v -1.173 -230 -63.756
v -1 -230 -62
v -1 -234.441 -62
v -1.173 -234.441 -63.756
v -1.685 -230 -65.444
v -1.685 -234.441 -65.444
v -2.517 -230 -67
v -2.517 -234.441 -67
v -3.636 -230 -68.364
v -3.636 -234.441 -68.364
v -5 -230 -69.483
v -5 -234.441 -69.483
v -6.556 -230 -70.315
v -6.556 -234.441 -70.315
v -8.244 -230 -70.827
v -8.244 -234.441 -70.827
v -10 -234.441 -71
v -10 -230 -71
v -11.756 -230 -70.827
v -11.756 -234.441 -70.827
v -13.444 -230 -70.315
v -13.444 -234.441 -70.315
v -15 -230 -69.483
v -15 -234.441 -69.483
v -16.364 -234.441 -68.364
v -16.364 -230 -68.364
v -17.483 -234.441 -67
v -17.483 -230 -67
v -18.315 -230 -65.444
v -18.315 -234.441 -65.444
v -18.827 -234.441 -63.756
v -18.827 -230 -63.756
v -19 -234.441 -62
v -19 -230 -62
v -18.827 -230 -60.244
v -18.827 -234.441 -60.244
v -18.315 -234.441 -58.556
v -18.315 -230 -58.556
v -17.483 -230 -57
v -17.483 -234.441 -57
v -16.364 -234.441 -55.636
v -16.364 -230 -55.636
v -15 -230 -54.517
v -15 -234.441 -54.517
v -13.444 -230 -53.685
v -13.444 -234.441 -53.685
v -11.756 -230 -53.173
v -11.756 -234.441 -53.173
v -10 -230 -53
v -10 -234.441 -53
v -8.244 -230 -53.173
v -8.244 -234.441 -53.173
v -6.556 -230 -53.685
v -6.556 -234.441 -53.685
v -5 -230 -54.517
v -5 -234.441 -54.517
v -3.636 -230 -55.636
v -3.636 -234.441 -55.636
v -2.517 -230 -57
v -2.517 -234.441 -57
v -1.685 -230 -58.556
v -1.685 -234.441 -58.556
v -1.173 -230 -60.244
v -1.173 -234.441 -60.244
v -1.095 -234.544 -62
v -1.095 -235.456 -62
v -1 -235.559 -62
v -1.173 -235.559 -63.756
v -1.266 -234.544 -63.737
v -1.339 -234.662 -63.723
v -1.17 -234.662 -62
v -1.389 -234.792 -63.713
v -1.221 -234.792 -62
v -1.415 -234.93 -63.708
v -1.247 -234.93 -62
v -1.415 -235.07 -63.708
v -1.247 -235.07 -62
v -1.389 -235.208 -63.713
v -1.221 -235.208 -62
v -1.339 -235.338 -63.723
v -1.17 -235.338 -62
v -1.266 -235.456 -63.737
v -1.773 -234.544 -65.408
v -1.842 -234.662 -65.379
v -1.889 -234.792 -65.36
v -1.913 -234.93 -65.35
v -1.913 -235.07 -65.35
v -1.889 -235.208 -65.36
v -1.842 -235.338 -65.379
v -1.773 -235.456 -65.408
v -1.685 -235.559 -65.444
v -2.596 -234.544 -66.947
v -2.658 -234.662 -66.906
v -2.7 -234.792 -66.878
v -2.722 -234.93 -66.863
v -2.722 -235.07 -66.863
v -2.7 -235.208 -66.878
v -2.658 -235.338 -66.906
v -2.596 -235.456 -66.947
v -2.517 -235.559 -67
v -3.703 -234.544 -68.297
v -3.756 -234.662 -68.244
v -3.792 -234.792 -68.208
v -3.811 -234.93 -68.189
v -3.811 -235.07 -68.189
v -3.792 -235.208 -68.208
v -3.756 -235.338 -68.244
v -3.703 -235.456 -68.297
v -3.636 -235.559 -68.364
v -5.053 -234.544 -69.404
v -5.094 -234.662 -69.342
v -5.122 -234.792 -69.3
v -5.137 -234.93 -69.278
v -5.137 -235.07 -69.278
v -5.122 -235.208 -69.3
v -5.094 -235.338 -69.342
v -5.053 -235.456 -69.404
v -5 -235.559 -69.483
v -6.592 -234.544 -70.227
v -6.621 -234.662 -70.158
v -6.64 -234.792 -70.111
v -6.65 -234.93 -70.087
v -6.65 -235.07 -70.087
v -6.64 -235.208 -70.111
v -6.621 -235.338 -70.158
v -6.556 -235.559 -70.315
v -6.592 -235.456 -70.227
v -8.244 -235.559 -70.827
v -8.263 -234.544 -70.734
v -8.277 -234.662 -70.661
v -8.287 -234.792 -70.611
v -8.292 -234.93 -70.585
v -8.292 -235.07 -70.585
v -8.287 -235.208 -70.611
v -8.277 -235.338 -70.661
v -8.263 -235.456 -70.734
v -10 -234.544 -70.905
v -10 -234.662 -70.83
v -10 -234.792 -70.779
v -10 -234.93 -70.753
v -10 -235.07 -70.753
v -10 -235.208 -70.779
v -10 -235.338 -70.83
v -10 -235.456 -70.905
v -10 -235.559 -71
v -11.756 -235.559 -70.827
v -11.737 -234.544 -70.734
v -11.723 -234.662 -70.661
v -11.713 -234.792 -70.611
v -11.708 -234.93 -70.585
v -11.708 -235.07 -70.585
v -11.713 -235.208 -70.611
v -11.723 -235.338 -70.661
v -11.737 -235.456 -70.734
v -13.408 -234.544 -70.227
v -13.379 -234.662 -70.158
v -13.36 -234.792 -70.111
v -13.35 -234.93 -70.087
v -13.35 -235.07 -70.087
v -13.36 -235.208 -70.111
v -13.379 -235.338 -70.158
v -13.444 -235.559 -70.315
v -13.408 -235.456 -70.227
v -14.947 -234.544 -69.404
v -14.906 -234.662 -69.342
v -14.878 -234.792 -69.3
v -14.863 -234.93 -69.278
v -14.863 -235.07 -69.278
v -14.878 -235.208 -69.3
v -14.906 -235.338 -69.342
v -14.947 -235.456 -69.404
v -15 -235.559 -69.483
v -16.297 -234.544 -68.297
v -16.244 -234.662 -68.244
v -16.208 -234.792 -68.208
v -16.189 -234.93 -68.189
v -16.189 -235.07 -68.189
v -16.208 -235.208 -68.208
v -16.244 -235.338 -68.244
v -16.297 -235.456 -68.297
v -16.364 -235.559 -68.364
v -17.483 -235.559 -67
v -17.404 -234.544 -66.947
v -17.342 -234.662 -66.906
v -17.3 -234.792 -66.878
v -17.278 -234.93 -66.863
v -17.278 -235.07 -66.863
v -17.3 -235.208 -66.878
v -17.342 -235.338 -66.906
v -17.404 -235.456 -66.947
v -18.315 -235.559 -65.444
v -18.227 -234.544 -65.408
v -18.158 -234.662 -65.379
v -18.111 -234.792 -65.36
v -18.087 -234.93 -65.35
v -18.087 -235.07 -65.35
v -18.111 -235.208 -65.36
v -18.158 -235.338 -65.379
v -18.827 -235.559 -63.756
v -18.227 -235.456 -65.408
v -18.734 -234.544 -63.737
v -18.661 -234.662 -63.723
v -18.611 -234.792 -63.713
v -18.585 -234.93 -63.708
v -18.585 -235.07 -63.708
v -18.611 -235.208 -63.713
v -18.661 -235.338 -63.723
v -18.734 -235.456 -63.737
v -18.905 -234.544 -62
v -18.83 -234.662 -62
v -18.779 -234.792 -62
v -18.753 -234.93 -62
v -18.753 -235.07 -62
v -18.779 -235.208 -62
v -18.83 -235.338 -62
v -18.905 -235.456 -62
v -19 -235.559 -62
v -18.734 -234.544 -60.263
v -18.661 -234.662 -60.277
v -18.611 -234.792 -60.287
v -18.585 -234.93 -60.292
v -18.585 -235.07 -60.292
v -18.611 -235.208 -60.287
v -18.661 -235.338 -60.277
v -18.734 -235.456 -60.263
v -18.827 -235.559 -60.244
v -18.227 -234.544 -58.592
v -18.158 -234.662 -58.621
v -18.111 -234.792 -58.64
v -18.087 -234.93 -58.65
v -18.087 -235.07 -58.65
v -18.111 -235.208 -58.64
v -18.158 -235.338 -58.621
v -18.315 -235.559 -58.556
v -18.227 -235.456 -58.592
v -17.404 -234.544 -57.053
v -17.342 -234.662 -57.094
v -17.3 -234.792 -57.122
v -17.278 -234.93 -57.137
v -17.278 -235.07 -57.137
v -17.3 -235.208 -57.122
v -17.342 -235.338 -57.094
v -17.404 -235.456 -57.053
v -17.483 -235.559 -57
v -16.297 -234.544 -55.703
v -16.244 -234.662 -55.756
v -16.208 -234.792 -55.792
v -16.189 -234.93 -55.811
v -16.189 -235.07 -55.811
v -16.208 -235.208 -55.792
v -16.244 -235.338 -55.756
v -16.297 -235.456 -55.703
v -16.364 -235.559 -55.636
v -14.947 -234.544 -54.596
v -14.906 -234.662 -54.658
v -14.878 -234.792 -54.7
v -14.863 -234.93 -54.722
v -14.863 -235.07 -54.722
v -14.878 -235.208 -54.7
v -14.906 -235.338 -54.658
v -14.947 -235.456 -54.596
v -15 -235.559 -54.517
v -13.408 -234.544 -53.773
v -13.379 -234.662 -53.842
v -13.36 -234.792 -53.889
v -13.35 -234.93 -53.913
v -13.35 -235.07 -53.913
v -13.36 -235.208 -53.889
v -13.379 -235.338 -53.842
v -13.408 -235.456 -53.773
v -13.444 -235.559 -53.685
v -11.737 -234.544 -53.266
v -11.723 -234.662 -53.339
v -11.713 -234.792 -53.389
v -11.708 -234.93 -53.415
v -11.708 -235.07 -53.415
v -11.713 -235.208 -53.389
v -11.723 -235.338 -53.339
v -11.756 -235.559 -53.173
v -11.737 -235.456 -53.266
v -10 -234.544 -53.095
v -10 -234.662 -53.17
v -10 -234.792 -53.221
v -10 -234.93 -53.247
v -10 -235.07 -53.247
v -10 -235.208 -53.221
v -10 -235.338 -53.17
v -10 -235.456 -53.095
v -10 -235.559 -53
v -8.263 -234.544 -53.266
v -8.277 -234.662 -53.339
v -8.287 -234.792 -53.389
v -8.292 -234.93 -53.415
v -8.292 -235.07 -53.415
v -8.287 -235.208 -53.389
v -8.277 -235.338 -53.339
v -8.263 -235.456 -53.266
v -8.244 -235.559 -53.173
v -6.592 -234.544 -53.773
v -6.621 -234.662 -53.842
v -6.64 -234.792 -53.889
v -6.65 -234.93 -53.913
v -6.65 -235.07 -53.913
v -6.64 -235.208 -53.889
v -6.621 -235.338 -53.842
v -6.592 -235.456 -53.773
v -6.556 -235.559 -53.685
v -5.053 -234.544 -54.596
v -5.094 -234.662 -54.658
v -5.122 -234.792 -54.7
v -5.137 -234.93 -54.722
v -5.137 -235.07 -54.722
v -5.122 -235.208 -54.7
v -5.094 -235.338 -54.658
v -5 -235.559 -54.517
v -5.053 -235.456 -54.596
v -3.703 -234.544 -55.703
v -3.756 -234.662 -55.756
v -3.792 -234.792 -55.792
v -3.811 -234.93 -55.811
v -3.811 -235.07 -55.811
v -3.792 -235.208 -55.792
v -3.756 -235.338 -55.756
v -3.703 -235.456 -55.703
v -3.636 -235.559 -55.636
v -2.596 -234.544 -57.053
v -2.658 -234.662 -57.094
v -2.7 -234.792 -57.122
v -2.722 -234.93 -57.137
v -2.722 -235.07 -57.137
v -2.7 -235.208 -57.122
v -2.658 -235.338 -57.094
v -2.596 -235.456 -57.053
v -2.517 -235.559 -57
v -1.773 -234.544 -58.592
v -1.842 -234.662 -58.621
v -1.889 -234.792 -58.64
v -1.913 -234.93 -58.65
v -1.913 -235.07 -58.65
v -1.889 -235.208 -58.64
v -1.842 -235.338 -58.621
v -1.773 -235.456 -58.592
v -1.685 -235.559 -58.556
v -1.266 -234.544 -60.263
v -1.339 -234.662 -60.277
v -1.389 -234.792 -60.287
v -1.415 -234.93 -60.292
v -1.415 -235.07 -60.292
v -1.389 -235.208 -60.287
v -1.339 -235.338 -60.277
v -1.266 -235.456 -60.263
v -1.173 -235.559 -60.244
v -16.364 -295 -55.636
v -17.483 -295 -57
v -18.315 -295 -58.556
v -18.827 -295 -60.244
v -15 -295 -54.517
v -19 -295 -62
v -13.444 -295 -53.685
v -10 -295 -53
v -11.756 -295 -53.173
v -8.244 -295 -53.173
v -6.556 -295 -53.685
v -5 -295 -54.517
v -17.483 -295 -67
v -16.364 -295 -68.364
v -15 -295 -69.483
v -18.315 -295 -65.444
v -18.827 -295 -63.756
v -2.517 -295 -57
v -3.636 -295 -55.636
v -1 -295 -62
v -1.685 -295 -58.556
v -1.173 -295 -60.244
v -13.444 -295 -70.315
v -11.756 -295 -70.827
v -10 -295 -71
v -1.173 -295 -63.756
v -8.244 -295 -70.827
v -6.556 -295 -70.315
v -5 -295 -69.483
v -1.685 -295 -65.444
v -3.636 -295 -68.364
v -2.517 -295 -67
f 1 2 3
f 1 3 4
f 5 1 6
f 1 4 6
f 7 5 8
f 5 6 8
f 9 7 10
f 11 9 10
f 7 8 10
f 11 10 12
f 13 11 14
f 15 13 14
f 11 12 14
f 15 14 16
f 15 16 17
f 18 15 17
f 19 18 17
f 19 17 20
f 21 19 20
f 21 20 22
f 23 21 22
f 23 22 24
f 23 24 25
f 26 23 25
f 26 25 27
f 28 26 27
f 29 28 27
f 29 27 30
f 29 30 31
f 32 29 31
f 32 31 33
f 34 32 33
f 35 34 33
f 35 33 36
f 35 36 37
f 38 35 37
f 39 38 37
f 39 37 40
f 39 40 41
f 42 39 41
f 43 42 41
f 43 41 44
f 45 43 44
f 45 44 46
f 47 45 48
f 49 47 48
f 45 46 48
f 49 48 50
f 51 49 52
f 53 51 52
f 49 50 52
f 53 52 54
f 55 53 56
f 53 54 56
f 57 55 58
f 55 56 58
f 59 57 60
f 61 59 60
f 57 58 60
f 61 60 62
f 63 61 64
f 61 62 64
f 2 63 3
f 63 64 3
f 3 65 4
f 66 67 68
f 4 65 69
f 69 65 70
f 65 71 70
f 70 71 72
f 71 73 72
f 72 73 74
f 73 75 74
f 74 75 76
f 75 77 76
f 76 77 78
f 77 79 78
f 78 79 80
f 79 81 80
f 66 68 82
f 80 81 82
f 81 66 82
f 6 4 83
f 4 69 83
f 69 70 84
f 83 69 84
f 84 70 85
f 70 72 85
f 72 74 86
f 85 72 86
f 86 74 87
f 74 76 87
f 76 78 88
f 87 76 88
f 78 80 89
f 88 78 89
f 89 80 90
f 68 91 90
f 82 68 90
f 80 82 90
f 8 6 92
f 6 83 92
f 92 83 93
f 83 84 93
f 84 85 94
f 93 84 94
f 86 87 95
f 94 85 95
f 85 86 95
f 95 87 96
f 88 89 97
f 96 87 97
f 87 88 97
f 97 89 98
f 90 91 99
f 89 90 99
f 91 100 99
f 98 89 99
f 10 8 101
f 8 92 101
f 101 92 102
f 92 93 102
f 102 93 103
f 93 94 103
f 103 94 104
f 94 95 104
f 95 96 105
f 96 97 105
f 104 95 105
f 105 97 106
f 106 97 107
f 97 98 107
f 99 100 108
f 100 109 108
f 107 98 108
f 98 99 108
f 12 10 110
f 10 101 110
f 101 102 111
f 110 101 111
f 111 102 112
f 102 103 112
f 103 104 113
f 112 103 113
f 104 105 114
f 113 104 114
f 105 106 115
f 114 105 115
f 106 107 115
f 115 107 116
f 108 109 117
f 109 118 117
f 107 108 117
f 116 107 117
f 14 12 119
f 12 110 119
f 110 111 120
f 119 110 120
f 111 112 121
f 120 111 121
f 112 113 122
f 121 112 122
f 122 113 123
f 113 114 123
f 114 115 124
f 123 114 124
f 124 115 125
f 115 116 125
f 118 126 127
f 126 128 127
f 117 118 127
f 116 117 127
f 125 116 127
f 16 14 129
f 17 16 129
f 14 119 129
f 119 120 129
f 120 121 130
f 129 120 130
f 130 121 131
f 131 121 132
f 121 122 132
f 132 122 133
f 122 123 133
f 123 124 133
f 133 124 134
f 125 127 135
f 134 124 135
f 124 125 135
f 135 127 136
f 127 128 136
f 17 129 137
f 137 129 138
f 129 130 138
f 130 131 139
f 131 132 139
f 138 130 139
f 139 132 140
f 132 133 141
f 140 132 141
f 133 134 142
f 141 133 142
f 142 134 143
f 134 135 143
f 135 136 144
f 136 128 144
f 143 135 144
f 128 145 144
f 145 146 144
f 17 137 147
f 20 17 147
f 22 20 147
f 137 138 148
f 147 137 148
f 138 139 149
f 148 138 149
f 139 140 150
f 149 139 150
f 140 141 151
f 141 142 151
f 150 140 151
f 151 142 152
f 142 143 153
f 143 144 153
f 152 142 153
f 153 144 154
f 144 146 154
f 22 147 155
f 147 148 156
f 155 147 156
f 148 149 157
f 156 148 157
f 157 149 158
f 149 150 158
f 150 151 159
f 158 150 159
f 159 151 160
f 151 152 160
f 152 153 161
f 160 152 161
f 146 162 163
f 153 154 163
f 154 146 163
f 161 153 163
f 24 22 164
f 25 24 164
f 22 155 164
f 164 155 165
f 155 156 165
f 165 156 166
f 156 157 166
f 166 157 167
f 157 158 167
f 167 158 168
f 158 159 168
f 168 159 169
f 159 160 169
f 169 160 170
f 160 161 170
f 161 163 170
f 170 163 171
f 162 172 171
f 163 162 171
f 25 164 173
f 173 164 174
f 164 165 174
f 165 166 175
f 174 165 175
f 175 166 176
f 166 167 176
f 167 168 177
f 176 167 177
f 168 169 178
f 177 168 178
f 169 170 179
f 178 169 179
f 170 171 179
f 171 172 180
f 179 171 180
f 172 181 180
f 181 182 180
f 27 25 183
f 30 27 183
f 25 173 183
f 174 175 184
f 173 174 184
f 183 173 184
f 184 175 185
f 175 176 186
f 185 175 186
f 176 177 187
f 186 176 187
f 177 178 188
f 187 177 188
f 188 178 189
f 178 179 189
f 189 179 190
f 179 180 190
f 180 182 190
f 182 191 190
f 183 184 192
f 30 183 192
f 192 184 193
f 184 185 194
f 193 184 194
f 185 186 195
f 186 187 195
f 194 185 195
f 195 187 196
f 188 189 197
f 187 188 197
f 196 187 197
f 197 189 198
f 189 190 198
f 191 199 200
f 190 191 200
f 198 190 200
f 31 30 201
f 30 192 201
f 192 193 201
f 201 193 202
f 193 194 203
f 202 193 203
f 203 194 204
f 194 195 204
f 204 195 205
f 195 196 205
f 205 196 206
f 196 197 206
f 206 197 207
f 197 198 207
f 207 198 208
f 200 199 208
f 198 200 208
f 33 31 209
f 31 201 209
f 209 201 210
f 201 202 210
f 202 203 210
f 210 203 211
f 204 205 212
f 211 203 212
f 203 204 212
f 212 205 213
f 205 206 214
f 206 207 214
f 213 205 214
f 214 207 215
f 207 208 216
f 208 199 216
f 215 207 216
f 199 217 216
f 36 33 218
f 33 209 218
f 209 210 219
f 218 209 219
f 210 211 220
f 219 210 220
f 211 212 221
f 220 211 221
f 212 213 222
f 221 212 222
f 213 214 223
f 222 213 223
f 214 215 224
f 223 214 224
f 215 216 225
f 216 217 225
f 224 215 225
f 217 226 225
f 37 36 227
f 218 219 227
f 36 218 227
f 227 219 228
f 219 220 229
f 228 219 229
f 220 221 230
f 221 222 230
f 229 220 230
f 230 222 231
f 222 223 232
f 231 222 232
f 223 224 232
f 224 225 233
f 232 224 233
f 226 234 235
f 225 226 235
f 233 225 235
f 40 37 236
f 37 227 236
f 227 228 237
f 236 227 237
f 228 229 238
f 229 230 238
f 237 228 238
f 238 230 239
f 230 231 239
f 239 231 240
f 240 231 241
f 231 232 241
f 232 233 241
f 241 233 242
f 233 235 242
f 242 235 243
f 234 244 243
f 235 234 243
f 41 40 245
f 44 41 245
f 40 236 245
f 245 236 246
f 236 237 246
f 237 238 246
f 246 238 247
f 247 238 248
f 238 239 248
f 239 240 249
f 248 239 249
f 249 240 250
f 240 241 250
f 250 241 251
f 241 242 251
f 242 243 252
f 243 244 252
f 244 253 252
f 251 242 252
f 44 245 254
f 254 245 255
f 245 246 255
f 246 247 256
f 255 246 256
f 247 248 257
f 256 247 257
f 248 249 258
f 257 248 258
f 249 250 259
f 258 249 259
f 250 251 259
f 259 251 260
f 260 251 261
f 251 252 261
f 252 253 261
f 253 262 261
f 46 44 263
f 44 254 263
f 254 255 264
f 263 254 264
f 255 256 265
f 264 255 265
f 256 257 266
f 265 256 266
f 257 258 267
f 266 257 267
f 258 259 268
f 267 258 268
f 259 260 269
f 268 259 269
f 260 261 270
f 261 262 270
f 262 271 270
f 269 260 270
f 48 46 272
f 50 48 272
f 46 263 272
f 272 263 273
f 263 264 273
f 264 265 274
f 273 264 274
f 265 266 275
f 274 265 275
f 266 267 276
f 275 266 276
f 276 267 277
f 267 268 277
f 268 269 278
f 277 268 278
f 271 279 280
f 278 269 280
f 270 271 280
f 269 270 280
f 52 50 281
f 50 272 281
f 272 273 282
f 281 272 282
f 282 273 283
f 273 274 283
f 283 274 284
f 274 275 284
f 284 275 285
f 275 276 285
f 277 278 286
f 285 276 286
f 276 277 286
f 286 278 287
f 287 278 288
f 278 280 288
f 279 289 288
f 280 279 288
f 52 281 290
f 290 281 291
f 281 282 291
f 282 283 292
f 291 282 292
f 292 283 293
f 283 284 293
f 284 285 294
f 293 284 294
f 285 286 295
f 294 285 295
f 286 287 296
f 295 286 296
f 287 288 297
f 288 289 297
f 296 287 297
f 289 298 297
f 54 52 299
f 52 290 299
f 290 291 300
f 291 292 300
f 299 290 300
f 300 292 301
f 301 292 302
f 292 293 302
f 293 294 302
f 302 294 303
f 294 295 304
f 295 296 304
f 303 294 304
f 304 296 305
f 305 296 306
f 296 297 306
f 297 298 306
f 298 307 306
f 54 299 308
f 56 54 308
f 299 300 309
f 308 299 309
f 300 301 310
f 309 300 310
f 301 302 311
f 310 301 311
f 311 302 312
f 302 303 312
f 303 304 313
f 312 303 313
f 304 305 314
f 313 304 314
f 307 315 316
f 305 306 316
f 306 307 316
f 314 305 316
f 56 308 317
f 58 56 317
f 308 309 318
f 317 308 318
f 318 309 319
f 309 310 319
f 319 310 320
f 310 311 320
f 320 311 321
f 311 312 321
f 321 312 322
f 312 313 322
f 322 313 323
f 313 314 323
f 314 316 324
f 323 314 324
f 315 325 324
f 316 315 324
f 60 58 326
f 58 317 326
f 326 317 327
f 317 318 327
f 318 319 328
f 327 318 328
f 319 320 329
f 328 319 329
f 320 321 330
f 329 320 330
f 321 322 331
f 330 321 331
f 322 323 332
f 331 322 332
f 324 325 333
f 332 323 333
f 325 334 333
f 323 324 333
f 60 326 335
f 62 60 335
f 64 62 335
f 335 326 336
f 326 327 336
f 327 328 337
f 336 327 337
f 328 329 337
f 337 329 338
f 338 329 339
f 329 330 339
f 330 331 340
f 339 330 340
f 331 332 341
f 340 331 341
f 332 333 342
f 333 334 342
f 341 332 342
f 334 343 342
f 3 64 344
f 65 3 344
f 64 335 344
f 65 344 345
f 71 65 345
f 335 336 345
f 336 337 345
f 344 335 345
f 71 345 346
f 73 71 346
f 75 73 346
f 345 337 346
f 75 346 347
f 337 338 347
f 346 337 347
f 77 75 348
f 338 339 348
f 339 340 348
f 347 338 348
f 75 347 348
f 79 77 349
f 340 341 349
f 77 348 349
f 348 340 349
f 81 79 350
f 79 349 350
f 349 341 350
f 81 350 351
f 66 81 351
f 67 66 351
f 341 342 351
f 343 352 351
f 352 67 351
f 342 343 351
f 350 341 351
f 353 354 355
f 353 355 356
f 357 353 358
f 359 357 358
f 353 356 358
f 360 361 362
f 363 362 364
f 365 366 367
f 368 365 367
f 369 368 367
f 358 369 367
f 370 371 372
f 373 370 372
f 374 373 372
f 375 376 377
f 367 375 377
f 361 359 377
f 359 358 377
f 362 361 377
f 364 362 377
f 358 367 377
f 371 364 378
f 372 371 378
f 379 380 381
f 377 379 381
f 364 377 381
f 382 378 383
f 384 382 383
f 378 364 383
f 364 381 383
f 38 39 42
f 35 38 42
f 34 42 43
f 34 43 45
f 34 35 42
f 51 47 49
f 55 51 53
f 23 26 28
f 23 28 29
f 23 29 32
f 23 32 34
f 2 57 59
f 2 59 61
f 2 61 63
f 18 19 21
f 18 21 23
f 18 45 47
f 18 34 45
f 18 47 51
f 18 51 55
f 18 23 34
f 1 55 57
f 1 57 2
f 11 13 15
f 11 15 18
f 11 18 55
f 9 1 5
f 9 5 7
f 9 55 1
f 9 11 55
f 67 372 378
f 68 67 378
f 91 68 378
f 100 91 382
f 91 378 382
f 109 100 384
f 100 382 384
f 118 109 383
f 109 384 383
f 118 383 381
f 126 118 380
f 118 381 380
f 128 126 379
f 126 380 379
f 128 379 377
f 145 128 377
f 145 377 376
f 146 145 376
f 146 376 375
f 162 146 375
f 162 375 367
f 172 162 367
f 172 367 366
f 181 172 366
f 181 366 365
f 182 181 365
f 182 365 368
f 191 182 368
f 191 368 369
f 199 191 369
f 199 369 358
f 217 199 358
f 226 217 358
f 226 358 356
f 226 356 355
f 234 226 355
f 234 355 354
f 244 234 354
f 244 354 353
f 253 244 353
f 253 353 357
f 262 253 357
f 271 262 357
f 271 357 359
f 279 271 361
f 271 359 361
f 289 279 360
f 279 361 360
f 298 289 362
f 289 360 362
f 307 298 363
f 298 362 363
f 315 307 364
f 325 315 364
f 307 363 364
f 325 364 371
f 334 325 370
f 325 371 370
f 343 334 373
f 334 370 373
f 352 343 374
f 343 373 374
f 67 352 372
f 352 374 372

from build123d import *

# Parameters (mm, degrees)
TORUS_R                = 0.75
CYLINDER065_R          = 9
CYLINDER065_DEPTH      = 65
CUT094_PLACEMENT_ANGLE = 90


with BuildPart() as torus:
    # Torus → Torus (revolve)
    with BuildSketch(Plane(origin=(0, 0, 60), x_dir=(1, 0, 0), z_dir=(0, -1, 0))):
        with Locations((9.5, 0)):
            Circle(TORUS_R)
    revolve(axis=Axis((0, 0, 60), (0, 0, 1)))


with BuildPart() as cut094:
    # Cylinder065 → Cylinder065 (new body)
    with BuildSketch(Plane.XY):
        Circle(CYLINDER065_R)
    extrude(amount=CYLINDER065_DEPTH)

    # Cut094: cut Torus
    add(torus.part, mode=Mode.SUBTRACT)


with BuildPart() as cut094_1:
    # Cut094 placement: moved
    add(cut094.part.moved(Location((-10, -295, -62))).rotate(Axis((-10, -295, -62), (-1, 0, 0)), CUT094_PLACEMENT_ANGLE))


solid = cut094_1.part
